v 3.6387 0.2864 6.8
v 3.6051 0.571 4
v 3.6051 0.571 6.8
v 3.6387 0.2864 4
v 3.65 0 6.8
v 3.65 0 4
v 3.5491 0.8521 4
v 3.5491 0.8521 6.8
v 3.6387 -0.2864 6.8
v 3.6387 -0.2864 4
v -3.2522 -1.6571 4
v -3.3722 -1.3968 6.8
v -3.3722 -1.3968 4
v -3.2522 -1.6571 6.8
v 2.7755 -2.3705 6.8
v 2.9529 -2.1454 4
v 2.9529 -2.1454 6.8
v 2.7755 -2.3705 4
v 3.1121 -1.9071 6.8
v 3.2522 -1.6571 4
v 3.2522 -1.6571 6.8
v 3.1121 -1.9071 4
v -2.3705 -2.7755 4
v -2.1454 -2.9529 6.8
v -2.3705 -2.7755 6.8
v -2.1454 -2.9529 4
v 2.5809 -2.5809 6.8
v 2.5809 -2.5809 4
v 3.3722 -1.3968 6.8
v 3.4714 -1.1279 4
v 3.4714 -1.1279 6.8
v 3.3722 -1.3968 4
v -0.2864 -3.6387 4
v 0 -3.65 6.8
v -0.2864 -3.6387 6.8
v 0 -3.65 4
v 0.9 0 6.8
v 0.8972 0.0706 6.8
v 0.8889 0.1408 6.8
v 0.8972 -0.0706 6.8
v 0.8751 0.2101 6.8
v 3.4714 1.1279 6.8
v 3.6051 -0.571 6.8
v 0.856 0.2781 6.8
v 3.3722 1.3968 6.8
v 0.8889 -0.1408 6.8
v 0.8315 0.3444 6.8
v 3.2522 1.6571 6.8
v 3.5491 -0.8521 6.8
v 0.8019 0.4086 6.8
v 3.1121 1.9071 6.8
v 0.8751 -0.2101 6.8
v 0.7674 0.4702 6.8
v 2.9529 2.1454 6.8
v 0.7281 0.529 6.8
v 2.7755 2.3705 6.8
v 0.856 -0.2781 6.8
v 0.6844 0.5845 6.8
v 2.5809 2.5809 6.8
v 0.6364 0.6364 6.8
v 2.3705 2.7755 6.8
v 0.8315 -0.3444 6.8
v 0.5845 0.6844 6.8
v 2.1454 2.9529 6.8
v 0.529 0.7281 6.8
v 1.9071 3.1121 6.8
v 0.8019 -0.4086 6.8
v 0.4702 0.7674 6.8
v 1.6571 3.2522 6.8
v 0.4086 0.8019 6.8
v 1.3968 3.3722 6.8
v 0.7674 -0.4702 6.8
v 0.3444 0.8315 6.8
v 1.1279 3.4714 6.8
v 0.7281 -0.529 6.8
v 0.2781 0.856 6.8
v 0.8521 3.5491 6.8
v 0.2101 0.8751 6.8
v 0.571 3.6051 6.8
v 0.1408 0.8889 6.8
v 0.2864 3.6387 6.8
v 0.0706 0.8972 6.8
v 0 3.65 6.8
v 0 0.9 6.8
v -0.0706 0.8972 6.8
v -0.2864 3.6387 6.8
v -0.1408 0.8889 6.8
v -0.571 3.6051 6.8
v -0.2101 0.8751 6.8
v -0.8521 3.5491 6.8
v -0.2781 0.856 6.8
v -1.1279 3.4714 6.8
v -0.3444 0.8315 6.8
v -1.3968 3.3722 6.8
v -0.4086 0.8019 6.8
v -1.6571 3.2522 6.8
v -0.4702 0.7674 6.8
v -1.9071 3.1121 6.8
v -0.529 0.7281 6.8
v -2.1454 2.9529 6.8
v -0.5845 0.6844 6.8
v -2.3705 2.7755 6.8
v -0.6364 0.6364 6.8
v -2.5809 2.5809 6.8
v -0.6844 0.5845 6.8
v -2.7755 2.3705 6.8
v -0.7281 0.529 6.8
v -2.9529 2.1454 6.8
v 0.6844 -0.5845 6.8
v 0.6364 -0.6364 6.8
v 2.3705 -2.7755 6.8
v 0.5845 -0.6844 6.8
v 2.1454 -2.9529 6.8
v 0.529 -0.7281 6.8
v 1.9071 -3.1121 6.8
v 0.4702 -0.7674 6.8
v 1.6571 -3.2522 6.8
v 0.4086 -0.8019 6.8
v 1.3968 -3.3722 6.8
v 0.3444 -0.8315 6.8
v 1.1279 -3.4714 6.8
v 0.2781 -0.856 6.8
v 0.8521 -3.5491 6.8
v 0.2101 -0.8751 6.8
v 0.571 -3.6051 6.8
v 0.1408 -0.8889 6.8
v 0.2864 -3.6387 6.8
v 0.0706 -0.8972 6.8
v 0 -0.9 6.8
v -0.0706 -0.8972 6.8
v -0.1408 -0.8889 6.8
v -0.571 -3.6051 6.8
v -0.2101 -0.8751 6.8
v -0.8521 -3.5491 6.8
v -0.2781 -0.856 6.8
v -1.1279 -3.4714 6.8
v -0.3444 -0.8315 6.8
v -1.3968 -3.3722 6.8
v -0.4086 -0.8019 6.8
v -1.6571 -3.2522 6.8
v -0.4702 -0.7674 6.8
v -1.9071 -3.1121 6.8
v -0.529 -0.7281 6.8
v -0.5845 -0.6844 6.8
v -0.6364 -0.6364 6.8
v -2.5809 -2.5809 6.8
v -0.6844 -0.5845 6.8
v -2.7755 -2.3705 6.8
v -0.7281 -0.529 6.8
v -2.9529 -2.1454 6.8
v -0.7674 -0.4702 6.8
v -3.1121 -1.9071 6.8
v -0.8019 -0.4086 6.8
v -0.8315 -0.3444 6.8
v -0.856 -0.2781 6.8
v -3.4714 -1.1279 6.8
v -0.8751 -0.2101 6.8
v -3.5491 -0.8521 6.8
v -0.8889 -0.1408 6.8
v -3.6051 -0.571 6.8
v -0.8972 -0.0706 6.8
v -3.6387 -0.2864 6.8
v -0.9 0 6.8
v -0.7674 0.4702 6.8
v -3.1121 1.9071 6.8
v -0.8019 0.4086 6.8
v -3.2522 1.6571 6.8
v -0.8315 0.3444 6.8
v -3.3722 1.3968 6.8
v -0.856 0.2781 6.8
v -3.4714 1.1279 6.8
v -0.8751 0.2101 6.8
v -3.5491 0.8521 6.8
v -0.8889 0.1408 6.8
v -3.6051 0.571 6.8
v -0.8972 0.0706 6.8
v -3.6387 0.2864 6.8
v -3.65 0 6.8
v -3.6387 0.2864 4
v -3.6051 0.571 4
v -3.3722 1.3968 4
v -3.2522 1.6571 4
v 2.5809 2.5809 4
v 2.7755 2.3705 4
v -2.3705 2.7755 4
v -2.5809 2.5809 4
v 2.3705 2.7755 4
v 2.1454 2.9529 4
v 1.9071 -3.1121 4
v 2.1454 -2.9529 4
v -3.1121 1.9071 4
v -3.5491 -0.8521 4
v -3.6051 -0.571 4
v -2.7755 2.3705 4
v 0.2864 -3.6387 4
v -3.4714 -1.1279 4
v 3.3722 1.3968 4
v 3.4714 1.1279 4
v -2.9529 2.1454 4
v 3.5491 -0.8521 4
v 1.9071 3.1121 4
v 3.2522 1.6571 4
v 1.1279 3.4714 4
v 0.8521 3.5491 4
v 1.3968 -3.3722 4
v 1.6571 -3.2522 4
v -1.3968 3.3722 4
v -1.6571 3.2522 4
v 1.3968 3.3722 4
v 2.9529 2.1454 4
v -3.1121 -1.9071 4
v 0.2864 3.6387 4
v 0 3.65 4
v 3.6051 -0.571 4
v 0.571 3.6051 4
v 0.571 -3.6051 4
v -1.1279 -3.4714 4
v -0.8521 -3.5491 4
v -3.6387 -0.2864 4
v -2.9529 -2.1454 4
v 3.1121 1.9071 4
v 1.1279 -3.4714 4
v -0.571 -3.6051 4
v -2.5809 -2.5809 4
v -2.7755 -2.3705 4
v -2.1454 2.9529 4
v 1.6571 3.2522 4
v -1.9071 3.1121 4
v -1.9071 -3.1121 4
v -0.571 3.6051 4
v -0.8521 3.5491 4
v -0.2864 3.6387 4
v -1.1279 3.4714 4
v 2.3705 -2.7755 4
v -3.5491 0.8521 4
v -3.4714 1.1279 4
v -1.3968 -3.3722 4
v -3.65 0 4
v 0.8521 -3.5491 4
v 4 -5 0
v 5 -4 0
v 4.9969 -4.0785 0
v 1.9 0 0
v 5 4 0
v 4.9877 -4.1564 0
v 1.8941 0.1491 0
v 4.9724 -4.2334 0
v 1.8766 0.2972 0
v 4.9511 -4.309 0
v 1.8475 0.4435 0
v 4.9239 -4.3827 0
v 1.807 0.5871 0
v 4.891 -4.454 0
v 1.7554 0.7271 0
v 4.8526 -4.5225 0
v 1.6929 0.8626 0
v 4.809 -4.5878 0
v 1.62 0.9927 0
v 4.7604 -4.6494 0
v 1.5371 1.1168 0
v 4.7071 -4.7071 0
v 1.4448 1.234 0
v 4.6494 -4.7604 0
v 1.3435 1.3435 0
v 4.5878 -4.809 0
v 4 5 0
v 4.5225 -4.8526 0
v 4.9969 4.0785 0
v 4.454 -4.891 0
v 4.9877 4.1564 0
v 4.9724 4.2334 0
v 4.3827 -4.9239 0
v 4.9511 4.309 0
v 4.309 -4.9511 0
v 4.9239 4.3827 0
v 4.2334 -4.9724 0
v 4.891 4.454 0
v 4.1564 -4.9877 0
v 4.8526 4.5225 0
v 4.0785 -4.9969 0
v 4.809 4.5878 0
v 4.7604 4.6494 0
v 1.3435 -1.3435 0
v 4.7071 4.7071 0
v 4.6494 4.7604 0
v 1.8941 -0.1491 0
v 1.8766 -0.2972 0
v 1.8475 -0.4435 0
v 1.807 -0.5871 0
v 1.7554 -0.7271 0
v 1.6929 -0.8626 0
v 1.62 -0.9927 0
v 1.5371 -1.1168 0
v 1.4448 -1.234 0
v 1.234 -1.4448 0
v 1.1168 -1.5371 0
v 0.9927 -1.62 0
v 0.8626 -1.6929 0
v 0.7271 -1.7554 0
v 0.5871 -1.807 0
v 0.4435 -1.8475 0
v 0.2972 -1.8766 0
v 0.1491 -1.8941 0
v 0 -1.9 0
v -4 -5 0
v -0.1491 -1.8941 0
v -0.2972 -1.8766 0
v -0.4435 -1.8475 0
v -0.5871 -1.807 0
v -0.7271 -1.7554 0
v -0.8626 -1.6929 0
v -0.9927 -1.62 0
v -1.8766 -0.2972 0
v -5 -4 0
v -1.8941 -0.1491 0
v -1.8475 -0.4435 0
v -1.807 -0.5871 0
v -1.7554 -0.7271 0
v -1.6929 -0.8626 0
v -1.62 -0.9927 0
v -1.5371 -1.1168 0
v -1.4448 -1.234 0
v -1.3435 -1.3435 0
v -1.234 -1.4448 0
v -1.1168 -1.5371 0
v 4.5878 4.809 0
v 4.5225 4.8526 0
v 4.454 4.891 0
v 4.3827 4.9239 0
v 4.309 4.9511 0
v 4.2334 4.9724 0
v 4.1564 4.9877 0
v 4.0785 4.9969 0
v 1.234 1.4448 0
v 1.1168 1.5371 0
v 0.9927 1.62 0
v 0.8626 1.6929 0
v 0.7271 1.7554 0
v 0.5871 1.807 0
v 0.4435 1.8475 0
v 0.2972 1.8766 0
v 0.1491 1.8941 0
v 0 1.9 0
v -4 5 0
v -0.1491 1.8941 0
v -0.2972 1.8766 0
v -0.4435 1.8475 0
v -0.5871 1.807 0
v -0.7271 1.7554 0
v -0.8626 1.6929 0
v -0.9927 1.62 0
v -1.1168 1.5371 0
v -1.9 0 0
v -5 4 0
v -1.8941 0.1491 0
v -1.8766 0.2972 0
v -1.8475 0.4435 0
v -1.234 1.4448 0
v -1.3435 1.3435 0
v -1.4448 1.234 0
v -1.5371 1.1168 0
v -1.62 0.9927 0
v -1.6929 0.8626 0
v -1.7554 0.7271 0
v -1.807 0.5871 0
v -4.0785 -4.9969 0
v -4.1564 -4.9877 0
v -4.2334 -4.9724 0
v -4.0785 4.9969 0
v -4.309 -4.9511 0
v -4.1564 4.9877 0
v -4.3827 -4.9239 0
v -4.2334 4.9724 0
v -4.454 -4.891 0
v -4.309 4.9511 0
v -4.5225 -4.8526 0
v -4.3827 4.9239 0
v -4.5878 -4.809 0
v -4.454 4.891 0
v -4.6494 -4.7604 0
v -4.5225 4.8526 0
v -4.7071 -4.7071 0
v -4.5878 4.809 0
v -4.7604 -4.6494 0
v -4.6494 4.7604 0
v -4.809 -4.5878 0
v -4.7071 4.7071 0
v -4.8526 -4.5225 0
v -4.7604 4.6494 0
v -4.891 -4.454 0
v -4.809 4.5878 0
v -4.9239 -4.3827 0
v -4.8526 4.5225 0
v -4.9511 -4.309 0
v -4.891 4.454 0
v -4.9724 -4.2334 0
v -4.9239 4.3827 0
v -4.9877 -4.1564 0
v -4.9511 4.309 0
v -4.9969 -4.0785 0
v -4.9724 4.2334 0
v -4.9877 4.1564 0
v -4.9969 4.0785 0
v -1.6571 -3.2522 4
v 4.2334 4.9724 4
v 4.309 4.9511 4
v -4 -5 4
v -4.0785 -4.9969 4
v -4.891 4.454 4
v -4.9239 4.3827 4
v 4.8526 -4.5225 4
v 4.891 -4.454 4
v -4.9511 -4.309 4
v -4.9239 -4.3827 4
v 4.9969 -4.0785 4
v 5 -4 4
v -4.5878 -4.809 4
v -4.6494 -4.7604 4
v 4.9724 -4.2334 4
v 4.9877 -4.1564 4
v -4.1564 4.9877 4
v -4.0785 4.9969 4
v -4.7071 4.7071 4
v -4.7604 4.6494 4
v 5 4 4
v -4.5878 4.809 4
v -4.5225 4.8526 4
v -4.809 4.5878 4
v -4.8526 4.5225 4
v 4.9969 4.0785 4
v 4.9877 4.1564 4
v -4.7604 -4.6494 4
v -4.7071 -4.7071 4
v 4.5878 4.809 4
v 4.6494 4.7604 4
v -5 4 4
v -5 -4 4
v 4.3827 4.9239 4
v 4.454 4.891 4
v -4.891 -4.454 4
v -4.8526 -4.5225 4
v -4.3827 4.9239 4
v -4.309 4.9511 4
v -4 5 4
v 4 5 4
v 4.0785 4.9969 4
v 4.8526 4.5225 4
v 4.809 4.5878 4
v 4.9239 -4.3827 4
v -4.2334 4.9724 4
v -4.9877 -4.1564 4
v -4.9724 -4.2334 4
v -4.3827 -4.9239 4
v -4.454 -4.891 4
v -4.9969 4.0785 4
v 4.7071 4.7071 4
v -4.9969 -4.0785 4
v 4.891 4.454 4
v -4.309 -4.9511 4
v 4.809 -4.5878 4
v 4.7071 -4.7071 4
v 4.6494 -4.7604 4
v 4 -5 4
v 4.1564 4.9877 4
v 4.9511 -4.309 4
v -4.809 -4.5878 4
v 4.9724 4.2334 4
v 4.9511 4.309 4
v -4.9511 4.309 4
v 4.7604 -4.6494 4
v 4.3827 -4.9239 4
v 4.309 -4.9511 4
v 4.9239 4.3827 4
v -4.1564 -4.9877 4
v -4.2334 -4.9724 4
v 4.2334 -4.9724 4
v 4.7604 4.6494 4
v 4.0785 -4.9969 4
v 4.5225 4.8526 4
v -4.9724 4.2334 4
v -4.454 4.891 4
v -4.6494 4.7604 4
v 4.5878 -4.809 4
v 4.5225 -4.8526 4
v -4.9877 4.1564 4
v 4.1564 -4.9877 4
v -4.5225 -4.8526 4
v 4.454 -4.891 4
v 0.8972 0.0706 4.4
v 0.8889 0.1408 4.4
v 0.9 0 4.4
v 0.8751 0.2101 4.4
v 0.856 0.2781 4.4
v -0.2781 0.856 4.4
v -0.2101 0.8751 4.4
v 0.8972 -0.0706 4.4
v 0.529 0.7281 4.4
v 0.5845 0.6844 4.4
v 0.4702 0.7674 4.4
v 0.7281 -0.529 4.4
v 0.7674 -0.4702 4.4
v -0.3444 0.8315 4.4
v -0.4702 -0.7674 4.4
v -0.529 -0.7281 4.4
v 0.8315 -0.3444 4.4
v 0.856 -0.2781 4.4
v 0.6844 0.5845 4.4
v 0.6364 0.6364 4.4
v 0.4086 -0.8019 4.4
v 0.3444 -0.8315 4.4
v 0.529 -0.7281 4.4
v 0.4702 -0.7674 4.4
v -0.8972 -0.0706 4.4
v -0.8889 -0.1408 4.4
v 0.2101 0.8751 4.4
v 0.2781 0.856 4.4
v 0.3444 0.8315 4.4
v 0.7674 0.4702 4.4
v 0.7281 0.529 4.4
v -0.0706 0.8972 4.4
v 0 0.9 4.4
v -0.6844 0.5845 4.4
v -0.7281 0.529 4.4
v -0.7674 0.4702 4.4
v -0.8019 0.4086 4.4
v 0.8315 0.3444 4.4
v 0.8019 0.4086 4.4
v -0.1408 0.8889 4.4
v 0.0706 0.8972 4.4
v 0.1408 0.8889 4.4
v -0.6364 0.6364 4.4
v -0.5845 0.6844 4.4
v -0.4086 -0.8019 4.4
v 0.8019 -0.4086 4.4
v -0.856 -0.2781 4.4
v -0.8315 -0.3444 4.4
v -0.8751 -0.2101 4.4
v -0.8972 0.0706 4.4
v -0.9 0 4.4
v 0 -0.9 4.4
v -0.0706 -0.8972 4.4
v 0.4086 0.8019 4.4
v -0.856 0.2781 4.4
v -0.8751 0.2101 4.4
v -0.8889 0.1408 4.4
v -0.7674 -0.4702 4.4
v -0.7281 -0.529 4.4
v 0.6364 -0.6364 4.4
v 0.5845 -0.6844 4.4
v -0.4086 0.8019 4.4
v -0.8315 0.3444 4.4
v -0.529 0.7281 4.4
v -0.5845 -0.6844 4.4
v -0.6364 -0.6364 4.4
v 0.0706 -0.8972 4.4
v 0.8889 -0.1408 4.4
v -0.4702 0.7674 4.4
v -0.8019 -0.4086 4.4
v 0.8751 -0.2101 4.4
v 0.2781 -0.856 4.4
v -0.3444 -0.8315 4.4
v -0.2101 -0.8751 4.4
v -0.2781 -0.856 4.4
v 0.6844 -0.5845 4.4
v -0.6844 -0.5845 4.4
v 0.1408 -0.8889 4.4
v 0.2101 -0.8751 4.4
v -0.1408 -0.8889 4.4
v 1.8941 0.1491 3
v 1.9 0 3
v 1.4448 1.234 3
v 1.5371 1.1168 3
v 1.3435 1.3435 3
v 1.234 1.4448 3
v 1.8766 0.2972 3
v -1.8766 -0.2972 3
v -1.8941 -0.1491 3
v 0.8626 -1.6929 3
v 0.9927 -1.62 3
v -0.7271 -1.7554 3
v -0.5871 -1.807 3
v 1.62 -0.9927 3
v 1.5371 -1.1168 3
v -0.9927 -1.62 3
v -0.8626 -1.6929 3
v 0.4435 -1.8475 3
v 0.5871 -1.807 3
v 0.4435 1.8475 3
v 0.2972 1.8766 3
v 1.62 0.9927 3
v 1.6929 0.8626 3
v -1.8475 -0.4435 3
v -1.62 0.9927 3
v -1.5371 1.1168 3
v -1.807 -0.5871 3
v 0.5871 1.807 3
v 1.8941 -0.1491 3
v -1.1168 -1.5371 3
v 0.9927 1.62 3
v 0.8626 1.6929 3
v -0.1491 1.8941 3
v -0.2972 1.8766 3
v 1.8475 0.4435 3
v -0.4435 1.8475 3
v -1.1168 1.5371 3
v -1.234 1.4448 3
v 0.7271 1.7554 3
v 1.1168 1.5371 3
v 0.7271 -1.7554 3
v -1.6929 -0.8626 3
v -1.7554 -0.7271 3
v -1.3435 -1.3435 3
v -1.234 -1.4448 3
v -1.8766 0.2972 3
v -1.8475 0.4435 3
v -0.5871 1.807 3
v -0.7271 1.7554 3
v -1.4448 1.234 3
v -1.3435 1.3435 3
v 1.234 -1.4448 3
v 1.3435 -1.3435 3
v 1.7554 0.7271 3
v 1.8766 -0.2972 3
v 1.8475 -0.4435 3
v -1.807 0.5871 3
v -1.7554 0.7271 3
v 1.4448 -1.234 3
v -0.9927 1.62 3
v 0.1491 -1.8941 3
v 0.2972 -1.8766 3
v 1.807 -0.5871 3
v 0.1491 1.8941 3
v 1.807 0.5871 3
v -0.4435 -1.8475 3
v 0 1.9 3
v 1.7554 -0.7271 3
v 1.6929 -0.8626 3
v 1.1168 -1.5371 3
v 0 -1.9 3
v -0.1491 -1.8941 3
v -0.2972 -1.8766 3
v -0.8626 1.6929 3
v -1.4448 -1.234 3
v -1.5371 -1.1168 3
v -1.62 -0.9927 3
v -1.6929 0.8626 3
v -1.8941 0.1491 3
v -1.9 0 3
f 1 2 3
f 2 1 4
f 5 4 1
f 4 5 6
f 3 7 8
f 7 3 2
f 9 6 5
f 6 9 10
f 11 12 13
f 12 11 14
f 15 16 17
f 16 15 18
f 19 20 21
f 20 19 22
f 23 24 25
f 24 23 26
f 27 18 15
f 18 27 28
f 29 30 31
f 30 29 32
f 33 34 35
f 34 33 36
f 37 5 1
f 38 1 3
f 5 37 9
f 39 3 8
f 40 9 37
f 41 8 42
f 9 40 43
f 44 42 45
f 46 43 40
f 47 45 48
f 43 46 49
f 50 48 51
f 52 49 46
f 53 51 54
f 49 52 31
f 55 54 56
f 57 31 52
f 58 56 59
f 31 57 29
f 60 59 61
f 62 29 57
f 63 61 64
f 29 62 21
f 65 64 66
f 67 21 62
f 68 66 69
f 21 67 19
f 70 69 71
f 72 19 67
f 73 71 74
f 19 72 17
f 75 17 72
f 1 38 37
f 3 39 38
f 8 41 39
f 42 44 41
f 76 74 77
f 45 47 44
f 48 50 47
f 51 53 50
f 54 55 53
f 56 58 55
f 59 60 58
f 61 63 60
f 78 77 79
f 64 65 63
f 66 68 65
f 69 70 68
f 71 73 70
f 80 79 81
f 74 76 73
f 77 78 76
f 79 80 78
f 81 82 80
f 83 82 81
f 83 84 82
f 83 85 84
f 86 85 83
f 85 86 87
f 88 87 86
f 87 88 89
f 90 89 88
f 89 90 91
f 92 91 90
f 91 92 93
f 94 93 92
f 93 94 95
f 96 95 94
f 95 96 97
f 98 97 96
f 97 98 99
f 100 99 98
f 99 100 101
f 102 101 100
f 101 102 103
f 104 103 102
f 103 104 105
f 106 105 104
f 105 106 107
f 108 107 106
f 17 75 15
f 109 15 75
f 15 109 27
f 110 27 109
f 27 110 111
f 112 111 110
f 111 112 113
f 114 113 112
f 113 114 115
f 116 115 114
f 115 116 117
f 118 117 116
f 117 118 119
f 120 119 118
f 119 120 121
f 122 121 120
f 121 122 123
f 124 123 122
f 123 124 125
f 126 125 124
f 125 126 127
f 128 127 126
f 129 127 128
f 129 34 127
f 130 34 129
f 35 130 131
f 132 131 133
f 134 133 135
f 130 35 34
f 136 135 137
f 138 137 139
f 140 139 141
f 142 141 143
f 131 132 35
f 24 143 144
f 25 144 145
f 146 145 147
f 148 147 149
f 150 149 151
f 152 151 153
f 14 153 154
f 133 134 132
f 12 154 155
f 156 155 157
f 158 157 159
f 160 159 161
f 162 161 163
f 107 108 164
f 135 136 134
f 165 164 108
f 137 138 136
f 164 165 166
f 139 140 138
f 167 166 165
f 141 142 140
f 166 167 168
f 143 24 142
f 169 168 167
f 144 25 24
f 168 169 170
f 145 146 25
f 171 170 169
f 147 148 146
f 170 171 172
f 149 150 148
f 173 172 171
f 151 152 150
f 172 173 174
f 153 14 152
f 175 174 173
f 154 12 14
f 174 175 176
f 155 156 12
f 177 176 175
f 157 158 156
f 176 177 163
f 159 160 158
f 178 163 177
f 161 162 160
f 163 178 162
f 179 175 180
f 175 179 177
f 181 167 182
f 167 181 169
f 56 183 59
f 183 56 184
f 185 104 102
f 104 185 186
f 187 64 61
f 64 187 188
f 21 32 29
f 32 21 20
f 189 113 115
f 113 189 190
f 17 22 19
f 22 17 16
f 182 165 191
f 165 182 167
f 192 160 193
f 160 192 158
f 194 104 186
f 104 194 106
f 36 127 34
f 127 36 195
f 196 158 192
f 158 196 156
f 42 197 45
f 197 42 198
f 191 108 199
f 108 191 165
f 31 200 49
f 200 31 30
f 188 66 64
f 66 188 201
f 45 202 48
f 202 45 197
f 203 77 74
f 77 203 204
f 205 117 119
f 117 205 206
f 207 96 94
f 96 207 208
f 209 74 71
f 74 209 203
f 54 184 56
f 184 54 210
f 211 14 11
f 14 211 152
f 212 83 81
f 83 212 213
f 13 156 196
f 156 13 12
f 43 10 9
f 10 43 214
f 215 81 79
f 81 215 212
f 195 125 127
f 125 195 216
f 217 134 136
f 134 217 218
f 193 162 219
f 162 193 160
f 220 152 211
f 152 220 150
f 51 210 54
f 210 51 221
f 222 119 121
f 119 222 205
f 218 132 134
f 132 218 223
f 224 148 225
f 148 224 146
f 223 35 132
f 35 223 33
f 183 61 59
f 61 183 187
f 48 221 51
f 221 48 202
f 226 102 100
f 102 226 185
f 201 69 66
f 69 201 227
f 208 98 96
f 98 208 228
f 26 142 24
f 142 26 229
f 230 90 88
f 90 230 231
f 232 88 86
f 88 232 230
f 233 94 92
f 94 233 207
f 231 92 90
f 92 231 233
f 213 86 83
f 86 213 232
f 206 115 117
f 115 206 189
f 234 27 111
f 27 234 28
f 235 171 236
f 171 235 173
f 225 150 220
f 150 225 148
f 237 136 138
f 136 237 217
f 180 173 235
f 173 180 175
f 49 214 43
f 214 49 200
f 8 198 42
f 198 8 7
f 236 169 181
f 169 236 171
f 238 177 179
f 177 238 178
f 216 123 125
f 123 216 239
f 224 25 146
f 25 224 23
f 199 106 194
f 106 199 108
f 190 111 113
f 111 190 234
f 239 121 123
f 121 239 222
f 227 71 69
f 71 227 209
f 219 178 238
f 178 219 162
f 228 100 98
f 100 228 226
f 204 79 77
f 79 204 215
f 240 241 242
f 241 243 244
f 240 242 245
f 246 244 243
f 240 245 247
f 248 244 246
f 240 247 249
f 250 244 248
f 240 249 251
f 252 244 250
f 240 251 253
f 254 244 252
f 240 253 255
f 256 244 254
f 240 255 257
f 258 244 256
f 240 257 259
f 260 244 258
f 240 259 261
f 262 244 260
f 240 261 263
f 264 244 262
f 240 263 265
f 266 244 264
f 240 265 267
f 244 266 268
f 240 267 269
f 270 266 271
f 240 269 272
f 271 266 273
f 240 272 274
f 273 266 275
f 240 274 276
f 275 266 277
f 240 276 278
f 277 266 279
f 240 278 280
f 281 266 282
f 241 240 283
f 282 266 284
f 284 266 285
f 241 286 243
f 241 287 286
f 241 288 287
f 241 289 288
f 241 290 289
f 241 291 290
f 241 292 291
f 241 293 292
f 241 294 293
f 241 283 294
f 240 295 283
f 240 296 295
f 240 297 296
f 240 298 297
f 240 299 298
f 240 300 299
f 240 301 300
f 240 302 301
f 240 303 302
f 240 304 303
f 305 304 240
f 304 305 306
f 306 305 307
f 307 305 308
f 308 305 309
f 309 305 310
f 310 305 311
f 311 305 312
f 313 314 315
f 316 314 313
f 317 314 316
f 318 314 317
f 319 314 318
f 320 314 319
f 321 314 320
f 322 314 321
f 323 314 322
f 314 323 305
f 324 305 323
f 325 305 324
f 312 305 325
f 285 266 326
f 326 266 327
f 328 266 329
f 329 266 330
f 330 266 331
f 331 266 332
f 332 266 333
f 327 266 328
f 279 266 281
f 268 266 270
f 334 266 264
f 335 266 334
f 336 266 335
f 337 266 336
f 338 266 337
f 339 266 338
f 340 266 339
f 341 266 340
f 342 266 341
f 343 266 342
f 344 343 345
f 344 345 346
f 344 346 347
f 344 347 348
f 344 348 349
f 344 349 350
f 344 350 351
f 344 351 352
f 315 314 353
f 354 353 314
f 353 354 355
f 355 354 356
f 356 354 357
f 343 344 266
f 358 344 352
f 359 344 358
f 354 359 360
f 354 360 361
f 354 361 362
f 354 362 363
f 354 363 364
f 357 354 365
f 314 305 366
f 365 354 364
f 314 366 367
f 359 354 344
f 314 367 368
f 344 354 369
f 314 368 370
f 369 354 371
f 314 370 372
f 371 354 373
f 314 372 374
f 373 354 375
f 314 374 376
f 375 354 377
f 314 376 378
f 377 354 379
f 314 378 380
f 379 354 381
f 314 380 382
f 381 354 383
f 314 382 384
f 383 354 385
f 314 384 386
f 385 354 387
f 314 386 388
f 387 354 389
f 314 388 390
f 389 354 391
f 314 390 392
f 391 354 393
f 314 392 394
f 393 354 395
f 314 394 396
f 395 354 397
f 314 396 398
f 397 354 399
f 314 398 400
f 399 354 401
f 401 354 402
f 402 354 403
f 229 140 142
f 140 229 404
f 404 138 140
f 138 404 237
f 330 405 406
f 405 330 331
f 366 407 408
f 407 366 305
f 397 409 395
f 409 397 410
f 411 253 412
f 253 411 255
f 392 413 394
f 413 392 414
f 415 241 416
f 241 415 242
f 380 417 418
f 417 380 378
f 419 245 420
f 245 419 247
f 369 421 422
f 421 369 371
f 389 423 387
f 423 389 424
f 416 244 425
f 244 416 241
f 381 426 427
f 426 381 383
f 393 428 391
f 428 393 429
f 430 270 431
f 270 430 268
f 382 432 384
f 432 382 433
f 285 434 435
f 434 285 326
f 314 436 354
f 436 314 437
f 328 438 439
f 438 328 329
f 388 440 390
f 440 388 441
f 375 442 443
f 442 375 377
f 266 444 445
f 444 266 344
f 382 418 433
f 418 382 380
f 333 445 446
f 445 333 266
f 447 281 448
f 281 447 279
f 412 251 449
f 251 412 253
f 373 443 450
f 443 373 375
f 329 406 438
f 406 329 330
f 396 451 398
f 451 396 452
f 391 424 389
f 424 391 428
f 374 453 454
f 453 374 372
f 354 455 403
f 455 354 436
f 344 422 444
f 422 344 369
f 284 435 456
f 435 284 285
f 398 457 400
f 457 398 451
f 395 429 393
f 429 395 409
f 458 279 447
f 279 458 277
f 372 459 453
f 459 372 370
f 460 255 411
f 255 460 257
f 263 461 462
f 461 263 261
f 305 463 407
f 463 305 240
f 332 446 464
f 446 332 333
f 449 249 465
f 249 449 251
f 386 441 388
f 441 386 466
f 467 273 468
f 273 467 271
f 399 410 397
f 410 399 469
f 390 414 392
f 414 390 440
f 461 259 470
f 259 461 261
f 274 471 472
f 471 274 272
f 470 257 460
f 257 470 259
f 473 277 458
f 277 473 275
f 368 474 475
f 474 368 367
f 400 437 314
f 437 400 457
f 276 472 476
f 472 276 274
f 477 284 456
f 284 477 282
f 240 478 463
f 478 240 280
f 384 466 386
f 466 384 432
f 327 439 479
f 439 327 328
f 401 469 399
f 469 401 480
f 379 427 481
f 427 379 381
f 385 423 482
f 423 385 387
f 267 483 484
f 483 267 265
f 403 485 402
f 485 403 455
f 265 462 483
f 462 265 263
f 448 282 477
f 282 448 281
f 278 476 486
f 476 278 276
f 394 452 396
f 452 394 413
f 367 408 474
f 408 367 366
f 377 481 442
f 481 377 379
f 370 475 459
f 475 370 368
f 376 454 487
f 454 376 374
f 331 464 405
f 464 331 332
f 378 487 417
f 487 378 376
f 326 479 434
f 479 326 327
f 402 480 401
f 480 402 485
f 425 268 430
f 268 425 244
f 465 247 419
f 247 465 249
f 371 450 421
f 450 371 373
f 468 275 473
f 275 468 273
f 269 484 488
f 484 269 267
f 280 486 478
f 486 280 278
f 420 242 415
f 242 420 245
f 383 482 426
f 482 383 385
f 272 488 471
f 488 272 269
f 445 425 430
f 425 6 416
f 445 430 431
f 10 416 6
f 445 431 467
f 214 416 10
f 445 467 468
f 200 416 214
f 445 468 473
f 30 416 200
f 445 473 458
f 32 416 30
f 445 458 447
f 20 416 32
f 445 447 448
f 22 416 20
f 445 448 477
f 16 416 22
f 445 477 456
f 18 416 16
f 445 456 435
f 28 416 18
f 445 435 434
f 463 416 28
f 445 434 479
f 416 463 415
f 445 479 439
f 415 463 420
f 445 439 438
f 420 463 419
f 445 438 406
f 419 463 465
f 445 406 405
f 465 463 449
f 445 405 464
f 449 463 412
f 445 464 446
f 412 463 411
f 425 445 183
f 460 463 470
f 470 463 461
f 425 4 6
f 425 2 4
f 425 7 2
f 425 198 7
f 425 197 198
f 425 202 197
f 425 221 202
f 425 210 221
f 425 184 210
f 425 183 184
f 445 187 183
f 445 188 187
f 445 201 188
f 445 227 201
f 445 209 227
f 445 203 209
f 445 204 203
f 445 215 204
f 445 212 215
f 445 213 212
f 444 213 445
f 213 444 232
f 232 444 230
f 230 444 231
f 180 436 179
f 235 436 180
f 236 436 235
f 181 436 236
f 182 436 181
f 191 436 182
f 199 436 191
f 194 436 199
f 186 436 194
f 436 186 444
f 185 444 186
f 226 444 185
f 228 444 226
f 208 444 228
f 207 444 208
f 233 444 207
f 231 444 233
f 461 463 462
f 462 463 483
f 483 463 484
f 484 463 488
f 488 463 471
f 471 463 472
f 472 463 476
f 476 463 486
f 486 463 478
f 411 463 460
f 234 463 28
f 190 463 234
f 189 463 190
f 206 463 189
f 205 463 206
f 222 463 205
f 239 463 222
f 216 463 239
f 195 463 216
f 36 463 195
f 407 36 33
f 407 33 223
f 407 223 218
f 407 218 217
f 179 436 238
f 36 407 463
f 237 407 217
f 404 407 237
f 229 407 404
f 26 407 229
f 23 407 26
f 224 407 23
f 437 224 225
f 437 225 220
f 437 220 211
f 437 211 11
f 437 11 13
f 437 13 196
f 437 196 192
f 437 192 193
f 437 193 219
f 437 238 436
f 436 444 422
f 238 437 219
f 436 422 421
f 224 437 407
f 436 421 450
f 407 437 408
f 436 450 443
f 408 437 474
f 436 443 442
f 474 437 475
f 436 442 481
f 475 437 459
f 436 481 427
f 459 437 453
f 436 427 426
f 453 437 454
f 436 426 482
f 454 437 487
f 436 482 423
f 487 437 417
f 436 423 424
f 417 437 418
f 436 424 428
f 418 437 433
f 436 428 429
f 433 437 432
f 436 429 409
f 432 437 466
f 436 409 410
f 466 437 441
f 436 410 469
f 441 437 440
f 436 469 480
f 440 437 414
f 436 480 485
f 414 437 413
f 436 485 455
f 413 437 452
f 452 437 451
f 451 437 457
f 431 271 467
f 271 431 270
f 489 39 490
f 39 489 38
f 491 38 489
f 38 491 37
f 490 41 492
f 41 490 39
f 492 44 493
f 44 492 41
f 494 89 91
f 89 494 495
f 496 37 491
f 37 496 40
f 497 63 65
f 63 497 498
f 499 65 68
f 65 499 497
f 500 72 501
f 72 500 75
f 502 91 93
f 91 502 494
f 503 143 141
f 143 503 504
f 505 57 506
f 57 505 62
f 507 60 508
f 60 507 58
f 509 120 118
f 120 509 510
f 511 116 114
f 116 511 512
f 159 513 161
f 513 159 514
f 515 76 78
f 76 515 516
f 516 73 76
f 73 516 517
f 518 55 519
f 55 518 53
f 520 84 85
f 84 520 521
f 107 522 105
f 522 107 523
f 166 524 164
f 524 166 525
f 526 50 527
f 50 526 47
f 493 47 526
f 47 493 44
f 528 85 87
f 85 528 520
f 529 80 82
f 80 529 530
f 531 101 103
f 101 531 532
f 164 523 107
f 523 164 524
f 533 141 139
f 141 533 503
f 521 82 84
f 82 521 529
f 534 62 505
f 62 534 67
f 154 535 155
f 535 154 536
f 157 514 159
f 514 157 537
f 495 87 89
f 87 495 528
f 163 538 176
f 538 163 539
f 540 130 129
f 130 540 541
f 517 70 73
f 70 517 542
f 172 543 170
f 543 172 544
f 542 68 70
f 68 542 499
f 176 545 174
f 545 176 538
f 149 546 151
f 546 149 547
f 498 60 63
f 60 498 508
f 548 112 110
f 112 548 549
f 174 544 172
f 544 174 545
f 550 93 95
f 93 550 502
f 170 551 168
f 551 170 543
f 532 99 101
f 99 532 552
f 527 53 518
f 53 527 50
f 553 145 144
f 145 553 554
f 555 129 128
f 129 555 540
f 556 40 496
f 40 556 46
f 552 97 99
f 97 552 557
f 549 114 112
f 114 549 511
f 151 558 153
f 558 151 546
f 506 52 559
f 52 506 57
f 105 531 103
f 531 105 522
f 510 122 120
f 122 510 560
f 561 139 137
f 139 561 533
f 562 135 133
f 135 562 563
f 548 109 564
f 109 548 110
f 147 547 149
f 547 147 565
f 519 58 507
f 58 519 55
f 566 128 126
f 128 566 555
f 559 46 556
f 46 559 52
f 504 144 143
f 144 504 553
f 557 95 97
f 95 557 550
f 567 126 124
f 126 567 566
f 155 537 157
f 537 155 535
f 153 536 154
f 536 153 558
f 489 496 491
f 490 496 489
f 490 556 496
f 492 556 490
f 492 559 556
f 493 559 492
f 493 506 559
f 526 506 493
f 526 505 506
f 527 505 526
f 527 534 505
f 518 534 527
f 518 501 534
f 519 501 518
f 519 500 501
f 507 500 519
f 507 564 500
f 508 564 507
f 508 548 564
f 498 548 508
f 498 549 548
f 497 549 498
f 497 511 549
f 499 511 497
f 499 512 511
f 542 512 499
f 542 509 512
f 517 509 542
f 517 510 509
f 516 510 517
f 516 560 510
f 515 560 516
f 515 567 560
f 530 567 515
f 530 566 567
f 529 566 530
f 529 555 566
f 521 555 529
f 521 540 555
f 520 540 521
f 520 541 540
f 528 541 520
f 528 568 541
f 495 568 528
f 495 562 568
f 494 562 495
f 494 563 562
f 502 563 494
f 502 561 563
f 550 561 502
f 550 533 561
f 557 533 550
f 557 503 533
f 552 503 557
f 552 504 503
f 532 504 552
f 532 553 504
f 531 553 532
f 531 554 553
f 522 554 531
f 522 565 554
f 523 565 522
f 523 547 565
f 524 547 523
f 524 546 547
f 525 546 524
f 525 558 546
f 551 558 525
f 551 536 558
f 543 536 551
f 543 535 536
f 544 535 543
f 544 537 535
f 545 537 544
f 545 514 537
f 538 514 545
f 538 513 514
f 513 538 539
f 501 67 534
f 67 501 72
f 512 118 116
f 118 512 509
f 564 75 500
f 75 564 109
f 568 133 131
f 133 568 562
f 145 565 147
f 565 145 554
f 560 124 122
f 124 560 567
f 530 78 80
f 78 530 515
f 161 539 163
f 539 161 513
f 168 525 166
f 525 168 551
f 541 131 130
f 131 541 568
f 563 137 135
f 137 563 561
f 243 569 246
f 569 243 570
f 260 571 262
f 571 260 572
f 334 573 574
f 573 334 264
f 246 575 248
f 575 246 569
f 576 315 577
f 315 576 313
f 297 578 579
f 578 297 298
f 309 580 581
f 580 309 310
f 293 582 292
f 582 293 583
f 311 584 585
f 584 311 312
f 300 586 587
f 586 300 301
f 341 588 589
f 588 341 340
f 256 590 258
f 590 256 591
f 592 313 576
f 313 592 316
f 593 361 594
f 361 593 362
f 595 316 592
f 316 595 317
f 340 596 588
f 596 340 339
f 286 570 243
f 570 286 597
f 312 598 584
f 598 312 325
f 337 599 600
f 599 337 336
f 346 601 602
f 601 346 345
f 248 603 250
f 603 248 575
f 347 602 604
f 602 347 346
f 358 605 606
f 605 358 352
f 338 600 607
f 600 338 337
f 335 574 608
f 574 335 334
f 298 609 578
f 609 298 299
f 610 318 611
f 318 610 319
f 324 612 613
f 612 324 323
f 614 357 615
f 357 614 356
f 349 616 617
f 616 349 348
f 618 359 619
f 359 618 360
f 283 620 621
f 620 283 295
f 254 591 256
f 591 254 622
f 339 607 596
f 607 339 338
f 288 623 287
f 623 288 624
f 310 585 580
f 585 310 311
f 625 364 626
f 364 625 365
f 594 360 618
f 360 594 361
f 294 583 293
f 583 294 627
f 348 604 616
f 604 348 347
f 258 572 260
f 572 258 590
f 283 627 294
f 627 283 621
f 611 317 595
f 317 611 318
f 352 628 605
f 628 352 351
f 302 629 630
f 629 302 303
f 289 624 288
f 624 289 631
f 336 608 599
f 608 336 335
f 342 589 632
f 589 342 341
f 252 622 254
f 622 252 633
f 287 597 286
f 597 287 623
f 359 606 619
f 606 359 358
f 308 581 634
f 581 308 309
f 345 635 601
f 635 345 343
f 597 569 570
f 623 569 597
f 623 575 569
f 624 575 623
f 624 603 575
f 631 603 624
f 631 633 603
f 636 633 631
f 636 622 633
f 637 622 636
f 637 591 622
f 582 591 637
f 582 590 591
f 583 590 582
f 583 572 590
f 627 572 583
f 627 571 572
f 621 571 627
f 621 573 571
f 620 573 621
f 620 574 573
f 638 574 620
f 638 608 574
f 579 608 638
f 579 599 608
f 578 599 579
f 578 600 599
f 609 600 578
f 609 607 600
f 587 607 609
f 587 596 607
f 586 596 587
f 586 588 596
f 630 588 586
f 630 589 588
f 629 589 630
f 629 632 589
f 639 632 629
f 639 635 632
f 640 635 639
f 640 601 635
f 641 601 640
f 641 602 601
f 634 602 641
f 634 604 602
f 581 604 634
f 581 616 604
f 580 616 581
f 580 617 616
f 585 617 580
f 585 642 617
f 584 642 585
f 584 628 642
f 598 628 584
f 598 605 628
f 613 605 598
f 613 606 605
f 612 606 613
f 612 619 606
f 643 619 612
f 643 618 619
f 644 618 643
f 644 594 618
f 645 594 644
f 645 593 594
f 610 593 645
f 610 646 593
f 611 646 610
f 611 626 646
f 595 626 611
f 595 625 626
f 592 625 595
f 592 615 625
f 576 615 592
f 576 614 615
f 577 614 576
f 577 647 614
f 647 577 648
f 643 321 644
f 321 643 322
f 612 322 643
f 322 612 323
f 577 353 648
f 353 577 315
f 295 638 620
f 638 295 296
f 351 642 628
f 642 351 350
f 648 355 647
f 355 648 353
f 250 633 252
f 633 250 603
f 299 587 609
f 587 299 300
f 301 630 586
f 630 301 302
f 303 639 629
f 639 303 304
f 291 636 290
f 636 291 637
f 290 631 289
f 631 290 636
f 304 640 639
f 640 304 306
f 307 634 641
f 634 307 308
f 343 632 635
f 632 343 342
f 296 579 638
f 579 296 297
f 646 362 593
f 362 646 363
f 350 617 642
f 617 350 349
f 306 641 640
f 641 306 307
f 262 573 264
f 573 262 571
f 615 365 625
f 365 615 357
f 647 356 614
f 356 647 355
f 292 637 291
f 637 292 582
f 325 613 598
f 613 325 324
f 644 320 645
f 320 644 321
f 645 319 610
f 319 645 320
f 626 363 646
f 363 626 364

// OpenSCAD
// Varies; size of bolt hole in top.
// D_BASE = 3.9; // standard bolt
D_BASE = 1.8; // the little pins
//D_BASE = 4.1;

// Varies; height of base ring.
//H_RIM = 4.0; 
//H_RIM = 3.5;
// H_RIM = 3.3;
H_RIM = 4.0;

// Varies; height of entire thing
//H = 6.5; // with raised header
H = 6.8; // with flat top

SQUARE_OFF = true;
SHORTEN_FRONT = false;

D_PLATE = 7.3; //7.8;
D_TACTILE = 3.8;
H_TACTILE = 3.0;
D_PIN = 3.8;  
H_BASE = 2.4;

D_RIM = 10.0;
SQUARE = SHORTEN_FRONT ? 3.5 : D_RIM/2;

$fn = 80;

difference() 
{
    union() {
        cylinder(h=H, d=D_PLATE);
        if (SQUARE_OFF) {
            R = 1.0;
            hull() {
                translate([D_RIM/2-R, SQUARE-R, 0]) cylinder(h=H_RIM, r=R);
                translate([D_RIM/2-R, -D_RIM/2+R, 0]) cylinder(h=H_RIM, r=R);
                translate([-D_RIM/2+R, SQUARE-R, 0]) cylinder(h=H_RIM, r=R);
                translate([-D_RIM/2+R, -D_RIM/2+R, 0]) cylinder(h=H_RIM, r=R);
            }
        }
        else {
            cylinder(h=H_RIM, d=D_RIM);
        }
    }
    // top part
    translate([0, 0, H - H_BASE]) 
        cylinder(h=H_BASE, d=D_BASE);

    // pin
    //cylinder(h=H, d=D_PIN);

    // switch
    cylinder(h=H_TACTILE, d=D_TACTILE);
    H_CONE = (D_TACTILE - D_PIN)/2;
    translate([0, 0, H_TACTILE]) 
        cylinder(h=H_CONE, d=D_TACTILE);

    if (SHORTEN_FRONT) {
        translate([-10, SQUARE, 0]) cube(size=[20, 20, 20]);
    }
}
